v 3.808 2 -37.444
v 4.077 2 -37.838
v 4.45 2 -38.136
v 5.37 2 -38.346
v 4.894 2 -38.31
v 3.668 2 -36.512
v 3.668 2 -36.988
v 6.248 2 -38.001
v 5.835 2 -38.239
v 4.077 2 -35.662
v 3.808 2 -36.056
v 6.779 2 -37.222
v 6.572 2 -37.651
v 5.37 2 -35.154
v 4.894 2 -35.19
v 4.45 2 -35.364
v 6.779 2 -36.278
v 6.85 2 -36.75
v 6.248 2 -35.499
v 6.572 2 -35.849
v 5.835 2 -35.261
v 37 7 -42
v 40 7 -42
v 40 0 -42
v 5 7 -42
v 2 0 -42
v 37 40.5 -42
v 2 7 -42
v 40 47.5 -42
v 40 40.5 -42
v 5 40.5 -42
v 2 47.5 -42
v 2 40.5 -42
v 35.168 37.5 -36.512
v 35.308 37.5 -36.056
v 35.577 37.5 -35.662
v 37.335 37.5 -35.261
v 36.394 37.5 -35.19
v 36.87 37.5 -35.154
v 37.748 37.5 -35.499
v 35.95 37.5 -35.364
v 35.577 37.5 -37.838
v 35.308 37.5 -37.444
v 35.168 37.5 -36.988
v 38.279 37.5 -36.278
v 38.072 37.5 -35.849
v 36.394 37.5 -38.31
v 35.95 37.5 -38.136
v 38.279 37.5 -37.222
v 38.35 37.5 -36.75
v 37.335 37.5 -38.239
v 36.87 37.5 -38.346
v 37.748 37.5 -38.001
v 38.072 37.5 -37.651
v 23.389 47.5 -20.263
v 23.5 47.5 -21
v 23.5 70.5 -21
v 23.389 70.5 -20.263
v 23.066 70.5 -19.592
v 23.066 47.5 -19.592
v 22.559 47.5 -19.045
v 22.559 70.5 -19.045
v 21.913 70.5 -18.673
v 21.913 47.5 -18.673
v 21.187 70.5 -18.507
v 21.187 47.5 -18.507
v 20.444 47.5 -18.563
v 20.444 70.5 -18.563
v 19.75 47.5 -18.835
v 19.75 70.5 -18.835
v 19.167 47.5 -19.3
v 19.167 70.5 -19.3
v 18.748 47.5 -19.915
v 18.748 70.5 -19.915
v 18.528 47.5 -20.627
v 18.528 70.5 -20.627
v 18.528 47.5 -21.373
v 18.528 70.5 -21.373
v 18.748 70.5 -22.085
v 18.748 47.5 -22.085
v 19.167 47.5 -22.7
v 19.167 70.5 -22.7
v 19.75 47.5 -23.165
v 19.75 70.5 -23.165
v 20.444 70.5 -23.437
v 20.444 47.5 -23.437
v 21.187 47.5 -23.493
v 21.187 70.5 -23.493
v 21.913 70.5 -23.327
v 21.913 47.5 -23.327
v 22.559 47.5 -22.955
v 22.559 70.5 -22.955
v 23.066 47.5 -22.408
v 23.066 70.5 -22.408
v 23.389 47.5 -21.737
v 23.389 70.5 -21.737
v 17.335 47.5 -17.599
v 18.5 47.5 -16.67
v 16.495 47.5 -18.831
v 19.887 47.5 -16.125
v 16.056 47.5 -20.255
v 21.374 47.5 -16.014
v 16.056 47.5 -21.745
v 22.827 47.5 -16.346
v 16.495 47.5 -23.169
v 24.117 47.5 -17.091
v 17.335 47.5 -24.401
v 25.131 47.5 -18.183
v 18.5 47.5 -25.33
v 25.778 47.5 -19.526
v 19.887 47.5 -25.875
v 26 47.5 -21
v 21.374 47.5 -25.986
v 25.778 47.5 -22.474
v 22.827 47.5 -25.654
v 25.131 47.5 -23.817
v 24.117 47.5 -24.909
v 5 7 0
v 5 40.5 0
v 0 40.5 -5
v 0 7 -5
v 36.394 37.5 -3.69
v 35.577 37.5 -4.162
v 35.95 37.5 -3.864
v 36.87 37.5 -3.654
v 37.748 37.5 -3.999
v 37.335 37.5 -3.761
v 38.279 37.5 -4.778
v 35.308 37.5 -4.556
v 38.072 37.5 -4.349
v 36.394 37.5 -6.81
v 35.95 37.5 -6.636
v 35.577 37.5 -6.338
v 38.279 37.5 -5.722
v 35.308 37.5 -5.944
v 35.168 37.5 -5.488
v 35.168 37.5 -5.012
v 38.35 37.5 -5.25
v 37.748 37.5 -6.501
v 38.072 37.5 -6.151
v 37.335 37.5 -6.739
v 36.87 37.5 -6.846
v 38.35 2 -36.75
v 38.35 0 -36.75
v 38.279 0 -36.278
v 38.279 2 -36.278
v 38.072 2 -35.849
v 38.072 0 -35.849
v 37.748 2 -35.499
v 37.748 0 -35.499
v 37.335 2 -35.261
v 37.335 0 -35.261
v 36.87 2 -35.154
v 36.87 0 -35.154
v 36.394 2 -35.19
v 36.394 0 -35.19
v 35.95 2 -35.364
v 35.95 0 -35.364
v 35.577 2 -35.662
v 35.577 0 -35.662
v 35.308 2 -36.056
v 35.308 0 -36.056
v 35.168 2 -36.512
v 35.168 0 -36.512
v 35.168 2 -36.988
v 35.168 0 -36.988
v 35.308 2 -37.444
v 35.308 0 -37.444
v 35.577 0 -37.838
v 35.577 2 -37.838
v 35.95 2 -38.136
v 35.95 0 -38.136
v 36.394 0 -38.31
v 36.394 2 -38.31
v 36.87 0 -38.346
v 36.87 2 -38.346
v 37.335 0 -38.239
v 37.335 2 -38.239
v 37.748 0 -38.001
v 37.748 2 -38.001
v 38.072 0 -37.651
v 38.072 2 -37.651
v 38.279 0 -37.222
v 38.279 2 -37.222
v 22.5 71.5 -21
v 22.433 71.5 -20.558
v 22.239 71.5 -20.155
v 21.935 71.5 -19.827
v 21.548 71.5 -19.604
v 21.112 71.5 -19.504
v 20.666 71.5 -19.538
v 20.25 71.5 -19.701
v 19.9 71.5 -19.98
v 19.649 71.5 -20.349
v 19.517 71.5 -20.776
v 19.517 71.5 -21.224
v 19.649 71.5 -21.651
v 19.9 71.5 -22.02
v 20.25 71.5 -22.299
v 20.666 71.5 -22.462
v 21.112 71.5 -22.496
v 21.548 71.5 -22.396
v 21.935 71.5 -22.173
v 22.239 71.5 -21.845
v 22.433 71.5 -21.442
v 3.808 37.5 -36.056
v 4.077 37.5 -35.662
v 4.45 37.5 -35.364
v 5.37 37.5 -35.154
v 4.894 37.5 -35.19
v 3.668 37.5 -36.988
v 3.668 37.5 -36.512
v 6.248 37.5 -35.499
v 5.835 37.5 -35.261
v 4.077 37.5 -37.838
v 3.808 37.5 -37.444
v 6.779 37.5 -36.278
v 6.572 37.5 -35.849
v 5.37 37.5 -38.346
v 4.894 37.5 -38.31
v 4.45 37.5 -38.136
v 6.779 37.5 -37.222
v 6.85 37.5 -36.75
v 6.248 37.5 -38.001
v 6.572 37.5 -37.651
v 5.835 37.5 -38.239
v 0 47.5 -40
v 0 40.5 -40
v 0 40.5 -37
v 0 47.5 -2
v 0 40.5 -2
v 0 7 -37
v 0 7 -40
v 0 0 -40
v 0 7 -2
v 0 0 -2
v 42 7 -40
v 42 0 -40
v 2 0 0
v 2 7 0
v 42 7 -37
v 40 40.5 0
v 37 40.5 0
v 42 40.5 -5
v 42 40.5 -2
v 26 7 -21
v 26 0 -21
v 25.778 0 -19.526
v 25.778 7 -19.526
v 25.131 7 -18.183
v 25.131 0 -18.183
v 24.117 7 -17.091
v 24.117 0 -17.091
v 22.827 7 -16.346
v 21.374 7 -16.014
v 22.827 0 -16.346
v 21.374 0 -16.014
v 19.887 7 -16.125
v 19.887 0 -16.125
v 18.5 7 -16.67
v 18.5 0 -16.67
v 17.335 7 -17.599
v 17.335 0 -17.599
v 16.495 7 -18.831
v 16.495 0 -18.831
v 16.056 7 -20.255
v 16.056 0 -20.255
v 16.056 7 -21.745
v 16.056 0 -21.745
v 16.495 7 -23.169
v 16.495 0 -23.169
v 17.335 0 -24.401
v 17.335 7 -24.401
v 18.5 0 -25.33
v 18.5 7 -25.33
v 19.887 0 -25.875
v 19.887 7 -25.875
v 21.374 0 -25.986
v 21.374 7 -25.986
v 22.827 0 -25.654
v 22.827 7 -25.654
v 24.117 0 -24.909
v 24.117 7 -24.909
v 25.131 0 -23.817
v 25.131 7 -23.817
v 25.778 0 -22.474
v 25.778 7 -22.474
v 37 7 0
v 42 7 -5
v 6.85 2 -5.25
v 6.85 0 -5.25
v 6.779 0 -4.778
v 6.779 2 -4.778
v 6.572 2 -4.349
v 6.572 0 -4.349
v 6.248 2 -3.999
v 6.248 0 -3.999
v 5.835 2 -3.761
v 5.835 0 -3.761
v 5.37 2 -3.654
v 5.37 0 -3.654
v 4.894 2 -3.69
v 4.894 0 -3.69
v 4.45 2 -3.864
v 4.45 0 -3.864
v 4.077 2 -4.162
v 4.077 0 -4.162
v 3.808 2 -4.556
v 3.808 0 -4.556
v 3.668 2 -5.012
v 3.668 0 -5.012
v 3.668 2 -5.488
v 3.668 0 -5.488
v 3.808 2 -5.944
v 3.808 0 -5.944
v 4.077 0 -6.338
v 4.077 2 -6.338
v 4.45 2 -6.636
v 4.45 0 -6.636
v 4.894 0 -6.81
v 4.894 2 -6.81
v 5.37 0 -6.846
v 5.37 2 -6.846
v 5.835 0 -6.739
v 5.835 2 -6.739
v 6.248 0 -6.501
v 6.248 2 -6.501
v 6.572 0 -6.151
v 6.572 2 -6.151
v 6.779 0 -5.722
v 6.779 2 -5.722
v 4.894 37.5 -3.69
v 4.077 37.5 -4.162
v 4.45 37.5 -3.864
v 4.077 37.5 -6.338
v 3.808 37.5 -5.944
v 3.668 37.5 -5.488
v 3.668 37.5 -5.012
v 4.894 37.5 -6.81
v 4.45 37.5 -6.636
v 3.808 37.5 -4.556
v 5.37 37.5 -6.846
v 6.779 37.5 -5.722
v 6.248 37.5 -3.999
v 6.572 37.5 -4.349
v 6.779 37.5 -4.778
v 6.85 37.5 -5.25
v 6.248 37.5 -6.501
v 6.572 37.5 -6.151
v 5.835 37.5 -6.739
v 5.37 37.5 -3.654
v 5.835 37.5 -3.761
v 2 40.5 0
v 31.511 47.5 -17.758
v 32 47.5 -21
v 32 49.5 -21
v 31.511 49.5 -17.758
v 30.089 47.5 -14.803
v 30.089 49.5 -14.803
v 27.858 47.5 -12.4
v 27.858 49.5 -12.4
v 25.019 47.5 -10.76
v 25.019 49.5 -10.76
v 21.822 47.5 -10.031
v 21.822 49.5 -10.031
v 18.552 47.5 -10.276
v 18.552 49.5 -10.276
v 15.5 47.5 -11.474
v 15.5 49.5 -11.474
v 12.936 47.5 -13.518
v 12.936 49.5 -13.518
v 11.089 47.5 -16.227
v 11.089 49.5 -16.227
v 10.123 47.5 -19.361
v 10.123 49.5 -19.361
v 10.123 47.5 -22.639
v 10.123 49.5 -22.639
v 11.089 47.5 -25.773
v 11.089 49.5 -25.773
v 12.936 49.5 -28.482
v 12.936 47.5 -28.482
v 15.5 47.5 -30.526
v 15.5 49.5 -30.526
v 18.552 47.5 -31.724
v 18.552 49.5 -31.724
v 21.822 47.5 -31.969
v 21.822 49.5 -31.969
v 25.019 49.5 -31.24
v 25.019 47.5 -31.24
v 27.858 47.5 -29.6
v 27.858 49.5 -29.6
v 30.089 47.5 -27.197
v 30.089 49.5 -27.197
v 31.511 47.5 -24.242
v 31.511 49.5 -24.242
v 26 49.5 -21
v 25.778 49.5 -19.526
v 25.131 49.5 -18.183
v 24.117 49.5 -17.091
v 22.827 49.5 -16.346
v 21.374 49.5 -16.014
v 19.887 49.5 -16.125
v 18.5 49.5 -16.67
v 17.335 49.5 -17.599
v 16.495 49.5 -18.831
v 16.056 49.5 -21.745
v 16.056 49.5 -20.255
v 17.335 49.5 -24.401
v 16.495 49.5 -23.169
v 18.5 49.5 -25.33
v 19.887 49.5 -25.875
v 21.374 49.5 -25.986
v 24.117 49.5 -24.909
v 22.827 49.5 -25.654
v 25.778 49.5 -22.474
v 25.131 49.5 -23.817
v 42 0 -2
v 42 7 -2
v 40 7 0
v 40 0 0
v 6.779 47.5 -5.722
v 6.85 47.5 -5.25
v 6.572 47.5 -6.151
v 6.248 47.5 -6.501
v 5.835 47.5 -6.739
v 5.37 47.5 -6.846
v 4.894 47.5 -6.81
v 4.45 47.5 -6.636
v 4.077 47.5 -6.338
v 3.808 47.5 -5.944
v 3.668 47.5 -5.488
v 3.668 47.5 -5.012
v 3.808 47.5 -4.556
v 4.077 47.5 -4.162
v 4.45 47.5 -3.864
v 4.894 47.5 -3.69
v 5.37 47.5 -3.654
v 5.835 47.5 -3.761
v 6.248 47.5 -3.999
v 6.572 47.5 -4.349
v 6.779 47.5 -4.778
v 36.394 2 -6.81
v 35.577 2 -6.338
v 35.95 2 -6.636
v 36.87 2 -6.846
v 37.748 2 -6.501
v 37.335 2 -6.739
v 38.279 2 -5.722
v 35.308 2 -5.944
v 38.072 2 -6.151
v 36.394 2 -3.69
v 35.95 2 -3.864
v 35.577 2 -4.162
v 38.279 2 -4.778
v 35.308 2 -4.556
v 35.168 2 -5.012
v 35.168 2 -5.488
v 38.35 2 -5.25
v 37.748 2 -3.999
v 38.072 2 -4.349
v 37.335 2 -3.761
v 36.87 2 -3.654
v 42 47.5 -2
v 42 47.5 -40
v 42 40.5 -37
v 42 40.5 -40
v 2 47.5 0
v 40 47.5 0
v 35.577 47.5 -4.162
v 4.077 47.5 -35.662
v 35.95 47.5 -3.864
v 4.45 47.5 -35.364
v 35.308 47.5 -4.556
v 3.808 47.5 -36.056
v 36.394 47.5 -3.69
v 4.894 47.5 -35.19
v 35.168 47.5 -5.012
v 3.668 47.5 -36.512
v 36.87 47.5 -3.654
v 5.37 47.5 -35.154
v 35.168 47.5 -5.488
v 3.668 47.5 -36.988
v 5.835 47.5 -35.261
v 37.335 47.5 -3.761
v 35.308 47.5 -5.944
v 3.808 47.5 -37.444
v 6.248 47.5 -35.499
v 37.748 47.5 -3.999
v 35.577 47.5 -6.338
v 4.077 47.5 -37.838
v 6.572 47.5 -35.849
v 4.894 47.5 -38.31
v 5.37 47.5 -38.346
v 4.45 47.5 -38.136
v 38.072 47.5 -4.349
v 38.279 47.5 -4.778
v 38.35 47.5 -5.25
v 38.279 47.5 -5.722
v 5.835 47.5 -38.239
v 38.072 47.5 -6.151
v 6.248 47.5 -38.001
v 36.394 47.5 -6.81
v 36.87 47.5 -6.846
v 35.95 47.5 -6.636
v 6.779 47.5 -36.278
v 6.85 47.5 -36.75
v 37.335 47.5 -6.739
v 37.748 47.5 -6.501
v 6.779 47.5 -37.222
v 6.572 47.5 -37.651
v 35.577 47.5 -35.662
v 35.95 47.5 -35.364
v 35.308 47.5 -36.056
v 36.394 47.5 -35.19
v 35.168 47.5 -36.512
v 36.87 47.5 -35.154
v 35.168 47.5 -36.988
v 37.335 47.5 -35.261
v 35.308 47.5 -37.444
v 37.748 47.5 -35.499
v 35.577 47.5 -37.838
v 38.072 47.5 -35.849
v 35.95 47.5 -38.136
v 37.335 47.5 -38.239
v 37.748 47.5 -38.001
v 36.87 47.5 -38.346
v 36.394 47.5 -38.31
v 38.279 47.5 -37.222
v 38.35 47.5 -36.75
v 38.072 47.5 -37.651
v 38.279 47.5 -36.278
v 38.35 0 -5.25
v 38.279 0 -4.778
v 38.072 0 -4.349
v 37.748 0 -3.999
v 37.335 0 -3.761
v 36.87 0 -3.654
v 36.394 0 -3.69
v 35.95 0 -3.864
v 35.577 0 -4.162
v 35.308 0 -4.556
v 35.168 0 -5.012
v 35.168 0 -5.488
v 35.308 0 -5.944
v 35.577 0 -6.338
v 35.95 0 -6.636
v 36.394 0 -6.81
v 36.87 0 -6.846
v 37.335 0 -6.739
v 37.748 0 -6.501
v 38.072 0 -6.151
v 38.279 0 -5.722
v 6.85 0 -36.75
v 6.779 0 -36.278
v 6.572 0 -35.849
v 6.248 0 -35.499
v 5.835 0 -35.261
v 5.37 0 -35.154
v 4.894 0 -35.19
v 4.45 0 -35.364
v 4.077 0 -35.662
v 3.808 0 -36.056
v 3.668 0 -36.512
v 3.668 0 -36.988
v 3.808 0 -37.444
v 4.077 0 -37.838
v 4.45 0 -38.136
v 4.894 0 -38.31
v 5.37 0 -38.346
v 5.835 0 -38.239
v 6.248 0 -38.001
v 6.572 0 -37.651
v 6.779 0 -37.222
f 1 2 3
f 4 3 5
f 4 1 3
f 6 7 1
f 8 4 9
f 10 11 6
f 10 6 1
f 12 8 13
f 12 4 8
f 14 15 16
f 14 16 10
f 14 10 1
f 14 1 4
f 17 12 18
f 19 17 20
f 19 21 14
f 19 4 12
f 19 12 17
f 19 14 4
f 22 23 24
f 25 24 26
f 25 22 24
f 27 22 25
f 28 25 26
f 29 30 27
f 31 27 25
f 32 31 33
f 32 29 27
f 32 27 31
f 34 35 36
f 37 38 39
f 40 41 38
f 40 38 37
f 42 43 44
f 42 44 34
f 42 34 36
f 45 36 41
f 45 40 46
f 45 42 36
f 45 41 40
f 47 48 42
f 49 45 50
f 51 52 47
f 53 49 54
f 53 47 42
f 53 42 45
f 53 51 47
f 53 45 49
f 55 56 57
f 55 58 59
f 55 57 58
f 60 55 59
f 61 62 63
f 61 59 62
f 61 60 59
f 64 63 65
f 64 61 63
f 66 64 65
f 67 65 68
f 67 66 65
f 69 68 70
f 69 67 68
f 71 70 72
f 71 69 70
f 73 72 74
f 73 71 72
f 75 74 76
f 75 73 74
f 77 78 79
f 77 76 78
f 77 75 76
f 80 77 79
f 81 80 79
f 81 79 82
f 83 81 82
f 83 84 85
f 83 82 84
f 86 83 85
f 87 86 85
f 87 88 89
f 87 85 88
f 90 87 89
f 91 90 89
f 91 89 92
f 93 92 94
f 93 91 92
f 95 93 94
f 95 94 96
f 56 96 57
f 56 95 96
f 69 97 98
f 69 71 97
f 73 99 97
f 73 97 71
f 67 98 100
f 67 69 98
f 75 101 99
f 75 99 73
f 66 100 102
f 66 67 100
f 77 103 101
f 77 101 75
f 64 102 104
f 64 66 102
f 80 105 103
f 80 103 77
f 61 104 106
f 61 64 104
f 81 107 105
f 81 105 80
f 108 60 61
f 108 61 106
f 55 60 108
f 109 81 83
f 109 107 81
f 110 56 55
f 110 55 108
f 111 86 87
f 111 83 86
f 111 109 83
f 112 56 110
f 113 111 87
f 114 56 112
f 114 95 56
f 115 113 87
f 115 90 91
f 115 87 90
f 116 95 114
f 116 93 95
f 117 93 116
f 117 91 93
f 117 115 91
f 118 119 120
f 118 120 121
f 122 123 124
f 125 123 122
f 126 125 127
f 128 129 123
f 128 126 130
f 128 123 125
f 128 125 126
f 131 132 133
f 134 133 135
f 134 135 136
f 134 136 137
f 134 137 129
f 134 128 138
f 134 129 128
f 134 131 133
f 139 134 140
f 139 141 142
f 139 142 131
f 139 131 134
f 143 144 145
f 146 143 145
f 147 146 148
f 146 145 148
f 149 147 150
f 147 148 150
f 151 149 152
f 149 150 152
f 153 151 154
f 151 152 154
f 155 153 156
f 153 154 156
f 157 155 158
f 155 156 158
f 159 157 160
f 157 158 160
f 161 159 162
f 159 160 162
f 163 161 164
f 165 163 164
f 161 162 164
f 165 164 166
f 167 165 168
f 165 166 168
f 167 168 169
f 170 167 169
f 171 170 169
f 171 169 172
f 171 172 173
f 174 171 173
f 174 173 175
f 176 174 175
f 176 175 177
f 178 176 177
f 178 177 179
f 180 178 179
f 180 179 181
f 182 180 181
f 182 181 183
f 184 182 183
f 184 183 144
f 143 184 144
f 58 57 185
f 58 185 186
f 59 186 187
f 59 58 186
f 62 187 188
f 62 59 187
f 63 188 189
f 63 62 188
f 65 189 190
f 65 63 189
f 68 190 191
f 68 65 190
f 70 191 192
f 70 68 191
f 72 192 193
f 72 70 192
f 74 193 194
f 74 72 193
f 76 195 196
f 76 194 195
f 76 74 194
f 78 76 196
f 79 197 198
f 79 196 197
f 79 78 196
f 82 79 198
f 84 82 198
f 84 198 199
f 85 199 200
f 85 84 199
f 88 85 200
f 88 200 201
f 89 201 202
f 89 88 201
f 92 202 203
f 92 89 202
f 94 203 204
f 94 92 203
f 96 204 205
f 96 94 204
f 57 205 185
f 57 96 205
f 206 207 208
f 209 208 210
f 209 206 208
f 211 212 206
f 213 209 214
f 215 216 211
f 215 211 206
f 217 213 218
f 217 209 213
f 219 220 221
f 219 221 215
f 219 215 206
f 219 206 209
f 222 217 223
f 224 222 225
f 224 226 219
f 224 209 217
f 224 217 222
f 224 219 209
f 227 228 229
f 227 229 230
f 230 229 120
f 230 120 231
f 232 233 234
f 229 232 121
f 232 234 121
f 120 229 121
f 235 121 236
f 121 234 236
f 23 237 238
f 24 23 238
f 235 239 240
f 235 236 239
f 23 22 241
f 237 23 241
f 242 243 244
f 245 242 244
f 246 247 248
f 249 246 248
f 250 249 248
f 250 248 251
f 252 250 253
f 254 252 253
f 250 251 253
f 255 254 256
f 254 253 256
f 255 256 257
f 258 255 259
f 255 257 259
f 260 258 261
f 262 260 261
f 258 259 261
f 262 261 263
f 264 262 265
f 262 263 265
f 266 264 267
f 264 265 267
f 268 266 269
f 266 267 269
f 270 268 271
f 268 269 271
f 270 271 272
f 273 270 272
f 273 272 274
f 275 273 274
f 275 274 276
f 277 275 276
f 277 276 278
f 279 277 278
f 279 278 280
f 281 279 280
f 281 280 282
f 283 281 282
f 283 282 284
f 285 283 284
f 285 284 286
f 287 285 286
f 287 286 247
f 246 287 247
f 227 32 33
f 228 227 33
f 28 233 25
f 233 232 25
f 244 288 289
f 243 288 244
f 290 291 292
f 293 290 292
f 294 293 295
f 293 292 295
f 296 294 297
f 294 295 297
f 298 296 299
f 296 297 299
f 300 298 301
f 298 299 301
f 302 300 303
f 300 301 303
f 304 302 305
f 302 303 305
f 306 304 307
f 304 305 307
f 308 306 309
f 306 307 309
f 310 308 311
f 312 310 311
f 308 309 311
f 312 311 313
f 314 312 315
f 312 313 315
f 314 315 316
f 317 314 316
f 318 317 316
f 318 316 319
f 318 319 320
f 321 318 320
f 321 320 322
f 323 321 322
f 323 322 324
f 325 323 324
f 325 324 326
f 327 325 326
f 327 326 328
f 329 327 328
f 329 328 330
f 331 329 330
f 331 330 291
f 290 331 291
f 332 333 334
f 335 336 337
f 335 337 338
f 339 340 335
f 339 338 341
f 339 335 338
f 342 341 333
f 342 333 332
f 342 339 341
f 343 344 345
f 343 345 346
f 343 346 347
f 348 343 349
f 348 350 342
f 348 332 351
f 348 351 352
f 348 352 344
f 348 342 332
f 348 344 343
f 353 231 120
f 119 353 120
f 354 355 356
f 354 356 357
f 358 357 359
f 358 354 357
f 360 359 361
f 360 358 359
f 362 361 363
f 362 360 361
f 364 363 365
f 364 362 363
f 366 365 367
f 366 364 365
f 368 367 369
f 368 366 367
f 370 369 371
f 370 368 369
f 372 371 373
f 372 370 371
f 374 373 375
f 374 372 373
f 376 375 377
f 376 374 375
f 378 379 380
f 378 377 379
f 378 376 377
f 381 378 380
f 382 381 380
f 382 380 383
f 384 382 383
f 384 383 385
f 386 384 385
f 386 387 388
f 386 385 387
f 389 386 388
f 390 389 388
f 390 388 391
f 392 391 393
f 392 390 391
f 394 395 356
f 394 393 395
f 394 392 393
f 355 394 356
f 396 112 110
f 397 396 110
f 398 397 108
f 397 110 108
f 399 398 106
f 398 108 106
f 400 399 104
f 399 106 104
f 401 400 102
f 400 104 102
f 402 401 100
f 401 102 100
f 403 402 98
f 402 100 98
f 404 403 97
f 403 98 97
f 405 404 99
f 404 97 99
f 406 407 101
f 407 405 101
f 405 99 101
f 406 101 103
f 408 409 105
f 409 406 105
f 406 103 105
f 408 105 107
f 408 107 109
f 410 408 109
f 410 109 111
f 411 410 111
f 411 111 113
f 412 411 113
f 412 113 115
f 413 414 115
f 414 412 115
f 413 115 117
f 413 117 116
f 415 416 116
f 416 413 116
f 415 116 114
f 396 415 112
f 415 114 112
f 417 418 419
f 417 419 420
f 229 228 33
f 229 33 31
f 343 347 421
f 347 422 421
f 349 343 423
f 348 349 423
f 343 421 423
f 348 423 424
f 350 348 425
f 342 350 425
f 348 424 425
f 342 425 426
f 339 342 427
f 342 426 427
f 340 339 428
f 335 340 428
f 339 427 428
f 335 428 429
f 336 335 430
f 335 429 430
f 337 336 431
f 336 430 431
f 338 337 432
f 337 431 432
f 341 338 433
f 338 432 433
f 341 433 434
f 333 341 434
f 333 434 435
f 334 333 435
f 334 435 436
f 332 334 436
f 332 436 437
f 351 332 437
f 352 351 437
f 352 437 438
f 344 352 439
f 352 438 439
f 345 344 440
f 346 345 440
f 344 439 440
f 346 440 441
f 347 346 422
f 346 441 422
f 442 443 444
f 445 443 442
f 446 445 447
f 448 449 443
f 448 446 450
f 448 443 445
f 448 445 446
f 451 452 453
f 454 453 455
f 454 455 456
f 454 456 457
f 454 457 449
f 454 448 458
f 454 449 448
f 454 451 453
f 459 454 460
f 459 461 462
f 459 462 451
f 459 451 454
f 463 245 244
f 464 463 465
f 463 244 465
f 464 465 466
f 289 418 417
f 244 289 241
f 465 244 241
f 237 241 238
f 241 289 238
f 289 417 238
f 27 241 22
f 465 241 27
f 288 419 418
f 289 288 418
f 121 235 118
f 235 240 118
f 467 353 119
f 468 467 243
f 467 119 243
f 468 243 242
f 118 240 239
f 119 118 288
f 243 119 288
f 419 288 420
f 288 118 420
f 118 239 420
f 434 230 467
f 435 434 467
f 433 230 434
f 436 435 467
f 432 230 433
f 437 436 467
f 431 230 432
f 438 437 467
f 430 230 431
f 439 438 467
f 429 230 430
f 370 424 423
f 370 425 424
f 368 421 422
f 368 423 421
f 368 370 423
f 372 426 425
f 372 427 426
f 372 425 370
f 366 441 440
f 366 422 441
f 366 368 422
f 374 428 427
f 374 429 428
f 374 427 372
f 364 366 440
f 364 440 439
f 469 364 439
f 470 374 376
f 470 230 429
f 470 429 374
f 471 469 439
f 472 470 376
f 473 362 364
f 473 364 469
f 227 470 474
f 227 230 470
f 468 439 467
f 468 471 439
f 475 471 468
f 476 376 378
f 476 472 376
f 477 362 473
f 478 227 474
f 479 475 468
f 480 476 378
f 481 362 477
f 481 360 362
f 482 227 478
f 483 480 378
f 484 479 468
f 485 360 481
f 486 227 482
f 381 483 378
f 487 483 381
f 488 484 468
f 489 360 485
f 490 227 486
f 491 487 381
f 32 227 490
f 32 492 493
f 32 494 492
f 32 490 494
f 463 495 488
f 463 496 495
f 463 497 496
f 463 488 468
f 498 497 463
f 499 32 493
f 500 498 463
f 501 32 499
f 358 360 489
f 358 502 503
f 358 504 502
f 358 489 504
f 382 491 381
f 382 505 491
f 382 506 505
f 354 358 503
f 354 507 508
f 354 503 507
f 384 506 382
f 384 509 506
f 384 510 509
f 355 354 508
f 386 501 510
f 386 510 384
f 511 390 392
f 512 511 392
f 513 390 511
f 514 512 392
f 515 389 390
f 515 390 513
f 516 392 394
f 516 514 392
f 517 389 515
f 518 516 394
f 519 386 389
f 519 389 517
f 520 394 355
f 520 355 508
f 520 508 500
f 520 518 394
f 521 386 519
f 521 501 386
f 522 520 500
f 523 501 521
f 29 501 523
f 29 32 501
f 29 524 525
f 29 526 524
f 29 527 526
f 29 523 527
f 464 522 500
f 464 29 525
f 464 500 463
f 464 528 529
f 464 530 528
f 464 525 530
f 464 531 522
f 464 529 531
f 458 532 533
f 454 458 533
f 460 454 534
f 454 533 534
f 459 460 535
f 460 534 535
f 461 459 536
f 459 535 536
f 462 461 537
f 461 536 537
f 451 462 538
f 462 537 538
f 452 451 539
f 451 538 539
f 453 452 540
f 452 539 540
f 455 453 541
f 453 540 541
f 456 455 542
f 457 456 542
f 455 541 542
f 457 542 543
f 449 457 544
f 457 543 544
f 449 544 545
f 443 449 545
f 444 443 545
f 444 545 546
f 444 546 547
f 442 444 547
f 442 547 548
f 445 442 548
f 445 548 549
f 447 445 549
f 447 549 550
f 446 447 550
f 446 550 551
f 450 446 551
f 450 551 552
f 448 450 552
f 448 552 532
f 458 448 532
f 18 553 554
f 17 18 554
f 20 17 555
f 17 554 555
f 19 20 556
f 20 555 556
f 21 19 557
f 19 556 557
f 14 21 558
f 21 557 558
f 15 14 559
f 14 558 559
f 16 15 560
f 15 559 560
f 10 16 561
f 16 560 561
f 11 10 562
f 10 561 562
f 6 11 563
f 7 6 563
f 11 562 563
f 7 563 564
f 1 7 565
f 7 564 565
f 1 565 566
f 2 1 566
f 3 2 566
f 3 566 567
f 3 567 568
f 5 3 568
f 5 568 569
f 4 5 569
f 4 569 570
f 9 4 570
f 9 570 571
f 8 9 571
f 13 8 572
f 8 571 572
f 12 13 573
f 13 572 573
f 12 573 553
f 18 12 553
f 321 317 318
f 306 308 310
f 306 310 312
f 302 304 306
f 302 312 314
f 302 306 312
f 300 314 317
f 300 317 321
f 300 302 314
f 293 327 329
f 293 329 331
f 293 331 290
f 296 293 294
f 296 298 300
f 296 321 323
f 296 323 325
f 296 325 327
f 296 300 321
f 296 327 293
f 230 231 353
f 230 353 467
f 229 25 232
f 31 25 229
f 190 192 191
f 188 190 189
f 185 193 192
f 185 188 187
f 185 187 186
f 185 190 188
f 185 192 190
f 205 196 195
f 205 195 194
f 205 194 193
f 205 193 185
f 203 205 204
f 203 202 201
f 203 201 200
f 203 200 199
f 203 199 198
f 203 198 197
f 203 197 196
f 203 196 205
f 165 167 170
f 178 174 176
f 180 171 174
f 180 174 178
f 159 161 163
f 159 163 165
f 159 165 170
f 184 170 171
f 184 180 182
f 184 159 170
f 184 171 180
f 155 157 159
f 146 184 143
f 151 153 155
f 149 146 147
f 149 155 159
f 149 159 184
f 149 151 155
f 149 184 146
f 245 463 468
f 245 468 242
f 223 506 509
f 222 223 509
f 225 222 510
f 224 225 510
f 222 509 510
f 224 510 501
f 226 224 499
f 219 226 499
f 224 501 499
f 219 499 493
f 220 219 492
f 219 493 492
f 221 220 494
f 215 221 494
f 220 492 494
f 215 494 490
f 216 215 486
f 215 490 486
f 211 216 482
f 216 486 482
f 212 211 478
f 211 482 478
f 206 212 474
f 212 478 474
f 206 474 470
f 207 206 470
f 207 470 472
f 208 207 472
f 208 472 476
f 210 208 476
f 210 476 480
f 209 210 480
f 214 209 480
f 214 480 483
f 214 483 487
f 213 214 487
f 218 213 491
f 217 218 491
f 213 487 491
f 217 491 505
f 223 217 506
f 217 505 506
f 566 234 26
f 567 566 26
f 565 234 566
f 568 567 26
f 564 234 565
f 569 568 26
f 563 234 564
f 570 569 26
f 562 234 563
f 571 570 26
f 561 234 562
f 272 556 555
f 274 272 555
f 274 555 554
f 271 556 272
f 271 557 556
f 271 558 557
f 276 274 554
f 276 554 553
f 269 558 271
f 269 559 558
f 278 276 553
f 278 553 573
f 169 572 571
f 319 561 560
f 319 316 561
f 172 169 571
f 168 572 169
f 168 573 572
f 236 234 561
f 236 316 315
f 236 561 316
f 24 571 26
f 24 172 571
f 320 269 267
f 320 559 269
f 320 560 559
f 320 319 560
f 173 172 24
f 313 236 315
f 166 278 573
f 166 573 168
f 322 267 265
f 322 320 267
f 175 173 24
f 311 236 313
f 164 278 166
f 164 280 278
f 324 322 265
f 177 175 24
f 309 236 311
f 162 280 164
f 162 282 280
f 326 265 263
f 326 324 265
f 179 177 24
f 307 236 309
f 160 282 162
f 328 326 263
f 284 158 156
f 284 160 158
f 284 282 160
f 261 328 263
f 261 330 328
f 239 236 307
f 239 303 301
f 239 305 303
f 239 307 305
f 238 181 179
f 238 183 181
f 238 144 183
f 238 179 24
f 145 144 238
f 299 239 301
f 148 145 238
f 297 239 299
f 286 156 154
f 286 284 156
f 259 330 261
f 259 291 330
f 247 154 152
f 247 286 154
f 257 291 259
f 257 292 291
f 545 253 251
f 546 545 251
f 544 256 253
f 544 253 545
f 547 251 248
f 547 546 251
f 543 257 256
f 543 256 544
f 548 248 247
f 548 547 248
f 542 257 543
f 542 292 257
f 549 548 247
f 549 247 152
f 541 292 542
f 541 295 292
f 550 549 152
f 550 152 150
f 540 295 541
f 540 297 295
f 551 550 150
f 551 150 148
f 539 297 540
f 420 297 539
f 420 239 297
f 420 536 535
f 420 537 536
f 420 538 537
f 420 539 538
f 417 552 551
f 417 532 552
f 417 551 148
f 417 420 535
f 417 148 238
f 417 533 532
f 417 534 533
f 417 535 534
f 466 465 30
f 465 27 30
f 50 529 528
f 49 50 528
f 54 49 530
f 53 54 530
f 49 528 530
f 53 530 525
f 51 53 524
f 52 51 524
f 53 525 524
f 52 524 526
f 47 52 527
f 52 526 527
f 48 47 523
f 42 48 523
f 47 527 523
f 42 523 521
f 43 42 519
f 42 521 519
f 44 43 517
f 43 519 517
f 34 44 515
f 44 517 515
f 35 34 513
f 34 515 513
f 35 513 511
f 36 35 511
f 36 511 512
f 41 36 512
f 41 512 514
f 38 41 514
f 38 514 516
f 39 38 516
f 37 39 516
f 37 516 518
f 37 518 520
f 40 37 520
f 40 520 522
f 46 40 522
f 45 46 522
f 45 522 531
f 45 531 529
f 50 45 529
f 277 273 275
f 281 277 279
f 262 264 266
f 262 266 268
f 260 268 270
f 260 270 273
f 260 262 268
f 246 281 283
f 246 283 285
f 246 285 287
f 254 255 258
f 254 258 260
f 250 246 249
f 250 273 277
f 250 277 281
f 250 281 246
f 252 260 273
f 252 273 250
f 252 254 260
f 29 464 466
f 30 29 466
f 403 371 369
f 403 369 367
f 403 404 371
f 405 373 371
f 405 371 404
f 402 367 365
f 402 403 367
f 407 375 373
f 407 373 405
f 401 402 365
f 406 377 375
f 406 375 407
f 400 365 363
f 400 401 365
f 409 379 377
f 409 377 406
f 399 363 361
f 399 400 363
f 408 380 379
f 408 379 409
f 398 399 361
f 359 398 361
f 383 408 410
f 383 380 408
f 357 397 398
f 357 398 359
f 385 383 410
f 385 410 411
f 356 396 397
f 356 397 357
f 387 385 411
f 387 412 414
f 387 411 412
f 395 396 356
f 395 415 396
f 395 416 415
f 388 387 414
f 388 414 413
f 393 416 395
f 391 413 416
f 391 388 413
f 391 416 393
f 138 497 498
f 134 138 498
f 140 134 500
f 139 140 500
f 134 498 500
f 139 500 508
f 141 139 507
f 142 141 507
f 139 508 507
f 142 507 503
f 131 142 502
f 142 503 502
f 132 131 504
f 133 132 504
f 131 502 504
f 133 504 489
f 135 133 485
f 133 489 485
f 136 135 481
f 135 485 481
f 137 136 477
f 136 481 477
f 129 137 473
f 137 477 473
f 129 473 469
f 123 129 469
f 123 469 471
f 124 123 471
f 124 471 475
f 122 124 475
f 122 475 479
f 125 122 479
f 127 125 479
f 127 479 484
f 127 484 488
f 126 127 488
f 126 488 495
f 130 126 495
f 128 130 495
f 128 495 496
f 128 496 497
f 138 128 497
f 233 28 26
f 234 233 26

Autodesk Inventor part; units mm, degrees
ref_plane "YZ Plane" through (0, 0, 0) normal (1, 0, 0) x (0, 1, 0)
ref_plane "XZ Plane" through (0, 0, 0) normal (0, 1, 0) x (-1, 0, 0)
ref_plane "XY Plane" through (0, 0, 0) normal (0, 0, 1) x (1, 0, 0)
sketch "Sketch1" plane through (0, 0, 0) normal (0, 1, 0) x (-1, 0, 0)
  line L0 (0, 0) -> (-42, 0)
  line L1 (-42, 0) -> (-42, -42)
  line L2 (-42, -42) -> (0, -42)
  line L3 (0, -42) -> (0, 0)
  dimension "d0" = 42
  dimension "d1" = 42
extrude "Extrusion1" add sketch "Sketch1" along normal blind 47.5
chamfer "Chamfer1" distance 5 angle 45 4 edges at (42, 23.75, 0) (0, 23.75, 0) (0, 23.75, -42) (42, 23.75, -42)
sketch "Sketch3" plane through (0, 47.5, 0) normal (0, 1, 0) x (1, 0, 0)
  line L0 (0, 0) -> (42, 0)
  line L1 (42, 0) -> (42, 42)
  line L2 (42, 42) -> (0, 42)
  line L3 (0, 42) -> (0, 0)
  line L4 (37, 42) -> (5, 42) projected
  line L5 (42, 5) -> (42, 37) projected
extrude "Extrusion2" add sketch "Sketch3" against normal blind 7
sketch "Sketch4" plane through (0, 0, 0) normal (0, -1, 0) x (1, 0, 0)
  line L0 (0, 0) -> (42, 0) projected
  line L1 (0, -42) -> (0, 0) projected
  line L2 (42, 0) -> (0, 0)
  line L3 (0, 0) -> (0, -42)
  line L4 (0, -42) -> (42, -42)
  line L5 (42, -42) -> (42, 0)
extrude "Extrusion3" add sketch "Sketch4" against normal blind 7
chamfer "Chamfer2" distance 2 angle 45 8 edges at (42, 44, 0) (42, 3.5, 0) (42, 44, -42) (42, 3.5, -42) (0, 3.5, -42) (0, 3.5, 0) (0, 44, 0) (0, 44, -42)
sketch "Sketch5" plane through (0, 0, 0) normal (0, -1, 0) x (1, 0, 0)
  circle A0 centre (21, -21) radius 5
  line L0 (40, -42) -> (2, -42) projected
  line L1 (42, -40) -> (42, -2) projected
  point P0 (0, 0)
  dimension "d14" = 10
  dimension "d15" = 21
  dimension "d16" = 21
extrude "Extrusion4" cut sketch "Sketch5" against normal blind 7
sketch "Sketch6" plane through (0, 47.5, 0) normal (0, 1, 0) x (1, 0, 0)
  circle A0 centre (21, 21) radius 5 projected
  circle A1 centre (21, 21) radius 5
  circle A2 centre (21, 21) radius 11
  point P0 (0, 0)
  dimension "d19" = 10
  dimension "d20" = 22
extrude "Extrusion5" add sketch "Sketch6" along normal blind 2
sketch "Sketch7" plane through (0, 47.5, 0) normal (0, 1, 0) x (1, 0, 0)
  circle A0 centre (5.25, 5.25) radius 1.6
  circle A1 centre (5.25, 36.75) radius 1.6
  circle A2 centre (36.75, 36.75) radius 1.6
  circle A3 centre (36.75, 5.25) radius 1.6
  line L0 (2, 0) -> (40, 0) projected
  line L1 (0, 40) -> (0, 2) projected
  point P0 (0, 0)
  dimension "d23" = 3.2
  dimension "d24" = 3.2
  dimension "d25" = 3.2
  dimension "d26" = 3.2
  dimension "d27" = 31.5
  dimension "d28" = 31.5
  dimension "d29" = 31.5
  dimension "d30" = 31.5
  dimension "d31" = 5.25
  dimension "d32" = 5.25
  dimension "d33" = 5.25
  dimension "d34" = 5.25
extrude "Extrusion6" cut sketch "Sketch7" against normal blind 10
sketch "Sketch8" plane through (0, 0, 0) normal (0, -1, 0) x (1, 0, 0)
  circle A0 centre (5.25, -36.75) radius 1.6 projected
  circle A1 centre (5.25, -36.75) radius 1.6
  circle A2 centre (5.25, -5.25) radius 1.6 projected
  circle A3 centre (5.25, -5.25) radius 1.6
  circle A4 centre (36.75, -36.75) radius 1.6 projected
  circle A5 centre (36.75, -36.75) radius 1.6
  circle A6 centre (36.75, -5.25) radius 1.6 projected
  circle A7 centre (36.75, -5.25) radius 1.6
  point P0 (0, 0)
  dimension "d37" = 3.2
  dimension "d38" = 3.2
  dimension "d39" = 3.2
  dimension "d40" = 3.2
extrude "Extrusion7" cut sketch "Sketch8" against normal blind 2
sketch "Sketch9" plane through (21, 47.5, -21) normal (0, 1, 0) x (1, 0, 0)
  circle A0 centre (0, 0) radius 2.5
  line L0 (-21, 19) -> (-21, -19) projected
  line L1 (-19, -21) -> (19, -21) projected
  point P0 (-21, -21)
  dimension "d43" = 5
  dimension "d44" = 21
  dimension "d45" = 21
extrude "Extrusion8" add sketch "Sketch9" along normal blind 24
chamfer "Chamfer3" distance 1 angle 45 1 edges at (18.5, 71.5, -21)
properties part number "Nema17" material "Gold"
